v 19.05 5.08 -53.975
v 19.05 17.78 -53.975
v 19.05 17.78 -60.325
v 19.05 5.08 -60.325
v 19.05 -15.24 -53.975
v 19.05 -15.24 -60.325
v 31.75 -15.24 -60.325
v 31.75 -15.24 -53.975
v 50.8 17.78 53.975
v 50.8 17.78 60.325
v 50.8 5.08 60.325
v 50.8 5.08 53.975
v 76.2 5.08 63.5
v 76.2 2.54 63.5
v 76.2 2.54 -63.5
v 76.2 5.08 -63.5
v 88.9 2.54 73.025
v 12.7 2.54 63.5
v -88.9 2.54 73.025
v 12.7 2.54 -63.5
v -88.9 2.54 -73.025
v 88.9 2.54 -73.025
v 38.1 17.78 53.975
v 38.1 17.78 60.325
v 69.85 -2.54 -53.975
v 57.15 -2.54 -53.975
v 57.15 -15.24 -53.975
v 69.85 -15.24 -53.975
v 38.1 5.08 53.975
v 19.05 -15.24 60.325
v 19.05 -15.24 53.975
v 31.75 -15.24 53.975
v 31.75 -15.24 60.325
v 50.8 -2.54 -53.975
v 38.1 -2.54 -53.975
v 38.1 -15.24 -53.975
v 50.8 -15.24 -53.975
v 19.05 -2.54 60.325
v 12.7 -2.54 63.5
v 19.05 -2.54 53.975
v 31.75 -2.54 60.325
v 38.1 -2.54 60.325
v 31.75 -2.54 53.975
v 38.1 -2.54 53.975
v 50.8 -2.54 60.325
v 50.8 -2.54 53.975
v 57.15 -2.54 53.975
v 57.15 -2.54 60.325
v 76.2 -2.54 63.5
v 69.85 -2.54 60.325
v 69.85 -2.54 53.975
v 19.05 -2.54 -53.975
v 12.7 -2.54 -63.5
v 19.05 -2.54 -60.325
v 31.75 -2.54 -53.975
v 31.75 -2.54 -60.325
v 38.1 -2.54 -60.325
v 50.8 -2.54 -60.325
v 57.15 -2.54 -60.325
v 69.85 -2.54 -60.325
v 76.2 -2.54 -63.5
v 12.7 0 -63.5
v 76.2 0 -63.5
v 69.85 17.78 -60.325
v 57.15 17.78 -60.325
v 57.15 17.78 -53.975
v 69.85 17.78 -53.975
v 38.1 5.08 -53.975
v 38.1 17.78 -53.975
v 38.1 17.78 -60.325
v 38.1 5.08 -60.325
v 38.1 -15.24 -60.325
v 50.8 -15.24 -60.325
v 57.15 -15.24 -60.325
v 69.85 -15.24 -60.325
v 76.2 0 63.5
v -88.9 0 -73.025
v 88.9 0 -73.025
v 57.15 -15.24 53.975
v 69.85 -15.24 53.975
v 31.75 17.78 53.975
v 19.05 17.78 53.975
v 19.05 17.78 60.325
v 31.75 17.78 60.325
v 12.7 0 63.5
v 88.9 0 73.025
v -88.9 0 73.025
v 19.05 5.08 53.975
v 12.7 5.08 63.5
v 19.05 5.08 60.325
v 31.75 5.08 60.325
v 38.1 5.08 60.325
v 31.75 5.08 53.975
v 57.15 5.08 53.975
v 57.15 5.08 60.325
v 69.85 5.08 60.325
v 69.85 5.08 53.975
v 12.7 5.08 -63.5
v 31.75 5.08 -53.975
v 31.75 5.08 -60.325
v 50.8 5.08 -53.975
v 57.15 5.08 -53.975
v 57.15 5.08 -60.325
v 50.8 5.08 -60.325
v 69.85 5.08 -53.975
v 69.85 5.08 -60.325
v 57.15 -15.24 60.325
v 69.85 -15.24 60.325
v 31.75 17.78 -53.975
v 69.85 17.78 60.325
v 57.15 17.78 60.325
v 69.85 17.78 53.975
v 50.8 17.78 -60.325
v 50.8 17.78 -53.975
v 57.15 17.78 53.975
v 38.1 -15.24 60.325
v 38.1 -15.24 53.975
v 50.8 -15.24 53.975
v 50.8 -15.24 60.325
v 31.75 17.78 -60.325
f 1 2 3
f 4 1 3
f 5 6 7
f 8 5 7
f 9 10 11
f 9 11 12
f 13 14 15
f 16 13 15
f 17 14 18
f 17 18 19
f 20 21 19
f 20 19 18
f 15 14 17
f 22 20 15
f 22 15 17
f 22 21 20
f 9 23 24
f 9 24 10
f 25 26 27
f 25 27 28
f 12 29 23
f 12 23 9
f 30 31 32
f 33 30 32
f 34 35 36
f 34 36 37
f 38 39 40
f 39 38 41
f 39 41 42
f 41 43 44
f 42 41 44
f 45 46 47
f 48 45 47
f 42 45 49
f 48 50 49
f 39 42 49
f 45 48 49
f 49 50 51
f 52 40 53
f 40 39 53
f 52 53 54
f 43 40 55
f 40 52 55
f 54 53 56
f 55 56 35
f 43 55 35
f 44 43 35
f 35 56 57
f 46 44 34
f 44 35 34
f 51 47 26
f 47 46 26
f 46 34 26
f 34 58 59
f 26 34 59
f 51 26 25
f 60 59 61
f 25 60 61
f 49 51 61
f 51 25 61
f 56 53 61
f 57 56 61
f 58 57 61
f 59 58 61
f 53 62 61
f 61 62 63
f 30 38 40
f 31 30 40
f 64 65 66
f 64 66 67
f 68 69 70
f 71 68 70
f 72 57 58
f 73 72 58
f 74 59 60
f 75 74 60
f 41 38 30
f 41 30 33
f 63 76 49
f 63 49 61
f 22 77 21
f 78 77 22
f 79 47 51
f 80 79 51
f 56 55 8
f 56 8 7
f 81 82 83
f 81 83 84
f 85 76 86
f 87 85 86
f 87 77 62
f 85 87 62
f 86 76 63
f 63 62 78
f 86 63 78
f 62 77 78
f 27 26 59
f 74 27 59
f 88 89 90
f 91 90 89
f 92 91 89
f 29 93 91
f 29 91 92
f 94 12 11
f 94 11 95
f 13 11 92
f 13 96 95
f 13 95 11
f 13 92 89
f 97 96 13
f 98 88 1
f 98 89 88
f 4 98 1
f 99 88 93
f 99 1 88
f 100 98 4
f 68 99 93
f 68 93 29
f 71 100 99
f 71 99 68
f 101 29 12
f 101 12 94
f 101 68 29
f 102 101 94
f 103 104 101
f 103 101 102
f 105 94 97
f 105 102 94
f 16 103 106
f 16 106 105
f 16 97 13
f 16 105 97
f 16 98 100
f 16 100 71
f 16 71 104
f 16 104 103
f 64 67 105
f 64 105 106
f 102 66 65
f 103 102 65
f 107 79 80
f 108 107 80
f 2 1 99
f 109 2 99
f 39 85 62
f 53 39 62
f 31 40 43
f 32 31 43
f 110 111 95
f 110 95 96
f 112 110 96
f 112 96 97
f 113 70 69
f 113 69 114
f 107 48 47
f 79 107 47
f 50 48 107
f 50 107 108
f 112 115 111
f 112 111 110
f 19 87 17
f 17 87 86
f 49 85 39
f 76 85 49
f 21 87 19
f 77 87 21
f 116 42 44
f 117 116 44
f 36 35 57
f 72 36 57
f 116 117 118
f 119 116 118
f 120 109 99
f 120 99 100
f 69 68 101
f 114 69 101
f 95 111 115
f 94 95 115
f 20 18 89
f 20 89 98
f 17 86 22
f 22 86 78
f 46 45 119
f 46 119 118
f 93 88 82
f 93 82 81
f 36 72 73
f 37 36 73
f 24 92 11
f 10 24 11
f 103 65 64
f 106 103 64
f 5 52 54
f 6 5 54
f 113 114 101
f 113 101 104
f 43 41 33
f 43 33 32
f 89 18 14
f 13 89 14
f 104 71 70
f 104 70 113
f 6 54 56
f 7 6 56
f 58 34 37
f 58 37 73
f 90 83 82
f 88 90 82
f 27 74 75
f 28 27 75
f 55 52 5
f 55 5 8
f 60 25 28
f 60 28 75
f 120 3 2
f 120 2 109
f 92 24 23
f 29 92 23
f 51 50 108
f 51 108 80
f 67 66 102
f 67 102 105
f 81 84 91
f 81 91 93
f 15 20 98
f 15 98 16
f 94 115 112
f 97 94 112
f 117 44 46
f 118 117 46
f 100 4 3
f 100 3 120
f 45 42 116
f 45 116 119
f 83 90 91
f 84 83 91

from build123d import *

# Parameters (mm, degrees)
SKETCH1_W                = 177.8
SKETCH1_H                = 146.05
BOSS_EXTRUDE1_DEPTH      = 2.54
SKETCH2_W                = 63.5
SKETCH2_H                = 127
BOSS_EXTRUDE2_DEPTH      = 2.54
BOSS_EXTRUDE2_DEPTH_BACK = 5.08
SKETCH3_W                = 12.7
SKETCH3_H                = 6.35
BOSS_EXTRUDE3_DEPTH      = 12.7
BOSS_EXTRUDE3_DEPTH_BACK = 20.32


with BuildPart() as part:
    # Sketch1 → Boss-Extrude1 (new body)
    with BuildSketch(Plane(origin=(0, 0, 0), x_dir=(1, 0, 0), z_dir=(0, 1, 0))):
        Rectangle(SKETCH1_W, SKETCH1_H)
    extrude(amount=BOSS_EXTRUDE1_DEPTH)

    # Sketch2 → Boss-Extrude2 (add, two sides)
    with BuildSketch(Plane(origin=(0, 2.54, 0), x_dir=(1, 0, 0), z_dir=(0, 1, 0))) as boss_extrude2_sk:
        with Locations((44.45, 0)):
            Rectangle(SKETCH2_W, SKETCH2_H)
    extrude(amount=BOSS_EXTRUDE2_DEPTH)
    extrude(boss_extrude2_sk.sketch, amount=-BOSS_EXTRUDE2_DEPTH_BACK)

    # Sketch3 → Boss-Extrude3 (add, two sides)
    with BuildSketch(Plane(origin=(0, 5.08, 0), x_dir=(1, 0, 0), z_dir=(0, 1, 0))) as boss_extrude3_sk:
        with Locations((25.4, 57.15)):
            Rectangle(SKETCH3_W, SKETCH3_H)
        with Locations((44.45, 57.15)):
            Rectangle(SKETCH3_W, SKETCH3_H)
        with Locations((63.5, 57.15)):
            Rectangle(SKETCH3_W, SKETCH3_H)
        with Locations((63.5, -57.15)):
            Rectangle(SKETCH3_W, SKETCH3_H)
        with Locations((44.45, -57.15)):
            Rectangle(SKETCH3_W, SKETCH3_H)
        with Locations((25.4, -57.15)):
            Rectangle(SKETCH3_W, SKETCH3_H)
    extrude(amount=BOSS_EXTRUDE3_DEPTH)
    extrude(boss_extrude3_sk.sketch, amount=-BOSS_EXTRUDE3_DEPTH_BACK)


solid = part.part
